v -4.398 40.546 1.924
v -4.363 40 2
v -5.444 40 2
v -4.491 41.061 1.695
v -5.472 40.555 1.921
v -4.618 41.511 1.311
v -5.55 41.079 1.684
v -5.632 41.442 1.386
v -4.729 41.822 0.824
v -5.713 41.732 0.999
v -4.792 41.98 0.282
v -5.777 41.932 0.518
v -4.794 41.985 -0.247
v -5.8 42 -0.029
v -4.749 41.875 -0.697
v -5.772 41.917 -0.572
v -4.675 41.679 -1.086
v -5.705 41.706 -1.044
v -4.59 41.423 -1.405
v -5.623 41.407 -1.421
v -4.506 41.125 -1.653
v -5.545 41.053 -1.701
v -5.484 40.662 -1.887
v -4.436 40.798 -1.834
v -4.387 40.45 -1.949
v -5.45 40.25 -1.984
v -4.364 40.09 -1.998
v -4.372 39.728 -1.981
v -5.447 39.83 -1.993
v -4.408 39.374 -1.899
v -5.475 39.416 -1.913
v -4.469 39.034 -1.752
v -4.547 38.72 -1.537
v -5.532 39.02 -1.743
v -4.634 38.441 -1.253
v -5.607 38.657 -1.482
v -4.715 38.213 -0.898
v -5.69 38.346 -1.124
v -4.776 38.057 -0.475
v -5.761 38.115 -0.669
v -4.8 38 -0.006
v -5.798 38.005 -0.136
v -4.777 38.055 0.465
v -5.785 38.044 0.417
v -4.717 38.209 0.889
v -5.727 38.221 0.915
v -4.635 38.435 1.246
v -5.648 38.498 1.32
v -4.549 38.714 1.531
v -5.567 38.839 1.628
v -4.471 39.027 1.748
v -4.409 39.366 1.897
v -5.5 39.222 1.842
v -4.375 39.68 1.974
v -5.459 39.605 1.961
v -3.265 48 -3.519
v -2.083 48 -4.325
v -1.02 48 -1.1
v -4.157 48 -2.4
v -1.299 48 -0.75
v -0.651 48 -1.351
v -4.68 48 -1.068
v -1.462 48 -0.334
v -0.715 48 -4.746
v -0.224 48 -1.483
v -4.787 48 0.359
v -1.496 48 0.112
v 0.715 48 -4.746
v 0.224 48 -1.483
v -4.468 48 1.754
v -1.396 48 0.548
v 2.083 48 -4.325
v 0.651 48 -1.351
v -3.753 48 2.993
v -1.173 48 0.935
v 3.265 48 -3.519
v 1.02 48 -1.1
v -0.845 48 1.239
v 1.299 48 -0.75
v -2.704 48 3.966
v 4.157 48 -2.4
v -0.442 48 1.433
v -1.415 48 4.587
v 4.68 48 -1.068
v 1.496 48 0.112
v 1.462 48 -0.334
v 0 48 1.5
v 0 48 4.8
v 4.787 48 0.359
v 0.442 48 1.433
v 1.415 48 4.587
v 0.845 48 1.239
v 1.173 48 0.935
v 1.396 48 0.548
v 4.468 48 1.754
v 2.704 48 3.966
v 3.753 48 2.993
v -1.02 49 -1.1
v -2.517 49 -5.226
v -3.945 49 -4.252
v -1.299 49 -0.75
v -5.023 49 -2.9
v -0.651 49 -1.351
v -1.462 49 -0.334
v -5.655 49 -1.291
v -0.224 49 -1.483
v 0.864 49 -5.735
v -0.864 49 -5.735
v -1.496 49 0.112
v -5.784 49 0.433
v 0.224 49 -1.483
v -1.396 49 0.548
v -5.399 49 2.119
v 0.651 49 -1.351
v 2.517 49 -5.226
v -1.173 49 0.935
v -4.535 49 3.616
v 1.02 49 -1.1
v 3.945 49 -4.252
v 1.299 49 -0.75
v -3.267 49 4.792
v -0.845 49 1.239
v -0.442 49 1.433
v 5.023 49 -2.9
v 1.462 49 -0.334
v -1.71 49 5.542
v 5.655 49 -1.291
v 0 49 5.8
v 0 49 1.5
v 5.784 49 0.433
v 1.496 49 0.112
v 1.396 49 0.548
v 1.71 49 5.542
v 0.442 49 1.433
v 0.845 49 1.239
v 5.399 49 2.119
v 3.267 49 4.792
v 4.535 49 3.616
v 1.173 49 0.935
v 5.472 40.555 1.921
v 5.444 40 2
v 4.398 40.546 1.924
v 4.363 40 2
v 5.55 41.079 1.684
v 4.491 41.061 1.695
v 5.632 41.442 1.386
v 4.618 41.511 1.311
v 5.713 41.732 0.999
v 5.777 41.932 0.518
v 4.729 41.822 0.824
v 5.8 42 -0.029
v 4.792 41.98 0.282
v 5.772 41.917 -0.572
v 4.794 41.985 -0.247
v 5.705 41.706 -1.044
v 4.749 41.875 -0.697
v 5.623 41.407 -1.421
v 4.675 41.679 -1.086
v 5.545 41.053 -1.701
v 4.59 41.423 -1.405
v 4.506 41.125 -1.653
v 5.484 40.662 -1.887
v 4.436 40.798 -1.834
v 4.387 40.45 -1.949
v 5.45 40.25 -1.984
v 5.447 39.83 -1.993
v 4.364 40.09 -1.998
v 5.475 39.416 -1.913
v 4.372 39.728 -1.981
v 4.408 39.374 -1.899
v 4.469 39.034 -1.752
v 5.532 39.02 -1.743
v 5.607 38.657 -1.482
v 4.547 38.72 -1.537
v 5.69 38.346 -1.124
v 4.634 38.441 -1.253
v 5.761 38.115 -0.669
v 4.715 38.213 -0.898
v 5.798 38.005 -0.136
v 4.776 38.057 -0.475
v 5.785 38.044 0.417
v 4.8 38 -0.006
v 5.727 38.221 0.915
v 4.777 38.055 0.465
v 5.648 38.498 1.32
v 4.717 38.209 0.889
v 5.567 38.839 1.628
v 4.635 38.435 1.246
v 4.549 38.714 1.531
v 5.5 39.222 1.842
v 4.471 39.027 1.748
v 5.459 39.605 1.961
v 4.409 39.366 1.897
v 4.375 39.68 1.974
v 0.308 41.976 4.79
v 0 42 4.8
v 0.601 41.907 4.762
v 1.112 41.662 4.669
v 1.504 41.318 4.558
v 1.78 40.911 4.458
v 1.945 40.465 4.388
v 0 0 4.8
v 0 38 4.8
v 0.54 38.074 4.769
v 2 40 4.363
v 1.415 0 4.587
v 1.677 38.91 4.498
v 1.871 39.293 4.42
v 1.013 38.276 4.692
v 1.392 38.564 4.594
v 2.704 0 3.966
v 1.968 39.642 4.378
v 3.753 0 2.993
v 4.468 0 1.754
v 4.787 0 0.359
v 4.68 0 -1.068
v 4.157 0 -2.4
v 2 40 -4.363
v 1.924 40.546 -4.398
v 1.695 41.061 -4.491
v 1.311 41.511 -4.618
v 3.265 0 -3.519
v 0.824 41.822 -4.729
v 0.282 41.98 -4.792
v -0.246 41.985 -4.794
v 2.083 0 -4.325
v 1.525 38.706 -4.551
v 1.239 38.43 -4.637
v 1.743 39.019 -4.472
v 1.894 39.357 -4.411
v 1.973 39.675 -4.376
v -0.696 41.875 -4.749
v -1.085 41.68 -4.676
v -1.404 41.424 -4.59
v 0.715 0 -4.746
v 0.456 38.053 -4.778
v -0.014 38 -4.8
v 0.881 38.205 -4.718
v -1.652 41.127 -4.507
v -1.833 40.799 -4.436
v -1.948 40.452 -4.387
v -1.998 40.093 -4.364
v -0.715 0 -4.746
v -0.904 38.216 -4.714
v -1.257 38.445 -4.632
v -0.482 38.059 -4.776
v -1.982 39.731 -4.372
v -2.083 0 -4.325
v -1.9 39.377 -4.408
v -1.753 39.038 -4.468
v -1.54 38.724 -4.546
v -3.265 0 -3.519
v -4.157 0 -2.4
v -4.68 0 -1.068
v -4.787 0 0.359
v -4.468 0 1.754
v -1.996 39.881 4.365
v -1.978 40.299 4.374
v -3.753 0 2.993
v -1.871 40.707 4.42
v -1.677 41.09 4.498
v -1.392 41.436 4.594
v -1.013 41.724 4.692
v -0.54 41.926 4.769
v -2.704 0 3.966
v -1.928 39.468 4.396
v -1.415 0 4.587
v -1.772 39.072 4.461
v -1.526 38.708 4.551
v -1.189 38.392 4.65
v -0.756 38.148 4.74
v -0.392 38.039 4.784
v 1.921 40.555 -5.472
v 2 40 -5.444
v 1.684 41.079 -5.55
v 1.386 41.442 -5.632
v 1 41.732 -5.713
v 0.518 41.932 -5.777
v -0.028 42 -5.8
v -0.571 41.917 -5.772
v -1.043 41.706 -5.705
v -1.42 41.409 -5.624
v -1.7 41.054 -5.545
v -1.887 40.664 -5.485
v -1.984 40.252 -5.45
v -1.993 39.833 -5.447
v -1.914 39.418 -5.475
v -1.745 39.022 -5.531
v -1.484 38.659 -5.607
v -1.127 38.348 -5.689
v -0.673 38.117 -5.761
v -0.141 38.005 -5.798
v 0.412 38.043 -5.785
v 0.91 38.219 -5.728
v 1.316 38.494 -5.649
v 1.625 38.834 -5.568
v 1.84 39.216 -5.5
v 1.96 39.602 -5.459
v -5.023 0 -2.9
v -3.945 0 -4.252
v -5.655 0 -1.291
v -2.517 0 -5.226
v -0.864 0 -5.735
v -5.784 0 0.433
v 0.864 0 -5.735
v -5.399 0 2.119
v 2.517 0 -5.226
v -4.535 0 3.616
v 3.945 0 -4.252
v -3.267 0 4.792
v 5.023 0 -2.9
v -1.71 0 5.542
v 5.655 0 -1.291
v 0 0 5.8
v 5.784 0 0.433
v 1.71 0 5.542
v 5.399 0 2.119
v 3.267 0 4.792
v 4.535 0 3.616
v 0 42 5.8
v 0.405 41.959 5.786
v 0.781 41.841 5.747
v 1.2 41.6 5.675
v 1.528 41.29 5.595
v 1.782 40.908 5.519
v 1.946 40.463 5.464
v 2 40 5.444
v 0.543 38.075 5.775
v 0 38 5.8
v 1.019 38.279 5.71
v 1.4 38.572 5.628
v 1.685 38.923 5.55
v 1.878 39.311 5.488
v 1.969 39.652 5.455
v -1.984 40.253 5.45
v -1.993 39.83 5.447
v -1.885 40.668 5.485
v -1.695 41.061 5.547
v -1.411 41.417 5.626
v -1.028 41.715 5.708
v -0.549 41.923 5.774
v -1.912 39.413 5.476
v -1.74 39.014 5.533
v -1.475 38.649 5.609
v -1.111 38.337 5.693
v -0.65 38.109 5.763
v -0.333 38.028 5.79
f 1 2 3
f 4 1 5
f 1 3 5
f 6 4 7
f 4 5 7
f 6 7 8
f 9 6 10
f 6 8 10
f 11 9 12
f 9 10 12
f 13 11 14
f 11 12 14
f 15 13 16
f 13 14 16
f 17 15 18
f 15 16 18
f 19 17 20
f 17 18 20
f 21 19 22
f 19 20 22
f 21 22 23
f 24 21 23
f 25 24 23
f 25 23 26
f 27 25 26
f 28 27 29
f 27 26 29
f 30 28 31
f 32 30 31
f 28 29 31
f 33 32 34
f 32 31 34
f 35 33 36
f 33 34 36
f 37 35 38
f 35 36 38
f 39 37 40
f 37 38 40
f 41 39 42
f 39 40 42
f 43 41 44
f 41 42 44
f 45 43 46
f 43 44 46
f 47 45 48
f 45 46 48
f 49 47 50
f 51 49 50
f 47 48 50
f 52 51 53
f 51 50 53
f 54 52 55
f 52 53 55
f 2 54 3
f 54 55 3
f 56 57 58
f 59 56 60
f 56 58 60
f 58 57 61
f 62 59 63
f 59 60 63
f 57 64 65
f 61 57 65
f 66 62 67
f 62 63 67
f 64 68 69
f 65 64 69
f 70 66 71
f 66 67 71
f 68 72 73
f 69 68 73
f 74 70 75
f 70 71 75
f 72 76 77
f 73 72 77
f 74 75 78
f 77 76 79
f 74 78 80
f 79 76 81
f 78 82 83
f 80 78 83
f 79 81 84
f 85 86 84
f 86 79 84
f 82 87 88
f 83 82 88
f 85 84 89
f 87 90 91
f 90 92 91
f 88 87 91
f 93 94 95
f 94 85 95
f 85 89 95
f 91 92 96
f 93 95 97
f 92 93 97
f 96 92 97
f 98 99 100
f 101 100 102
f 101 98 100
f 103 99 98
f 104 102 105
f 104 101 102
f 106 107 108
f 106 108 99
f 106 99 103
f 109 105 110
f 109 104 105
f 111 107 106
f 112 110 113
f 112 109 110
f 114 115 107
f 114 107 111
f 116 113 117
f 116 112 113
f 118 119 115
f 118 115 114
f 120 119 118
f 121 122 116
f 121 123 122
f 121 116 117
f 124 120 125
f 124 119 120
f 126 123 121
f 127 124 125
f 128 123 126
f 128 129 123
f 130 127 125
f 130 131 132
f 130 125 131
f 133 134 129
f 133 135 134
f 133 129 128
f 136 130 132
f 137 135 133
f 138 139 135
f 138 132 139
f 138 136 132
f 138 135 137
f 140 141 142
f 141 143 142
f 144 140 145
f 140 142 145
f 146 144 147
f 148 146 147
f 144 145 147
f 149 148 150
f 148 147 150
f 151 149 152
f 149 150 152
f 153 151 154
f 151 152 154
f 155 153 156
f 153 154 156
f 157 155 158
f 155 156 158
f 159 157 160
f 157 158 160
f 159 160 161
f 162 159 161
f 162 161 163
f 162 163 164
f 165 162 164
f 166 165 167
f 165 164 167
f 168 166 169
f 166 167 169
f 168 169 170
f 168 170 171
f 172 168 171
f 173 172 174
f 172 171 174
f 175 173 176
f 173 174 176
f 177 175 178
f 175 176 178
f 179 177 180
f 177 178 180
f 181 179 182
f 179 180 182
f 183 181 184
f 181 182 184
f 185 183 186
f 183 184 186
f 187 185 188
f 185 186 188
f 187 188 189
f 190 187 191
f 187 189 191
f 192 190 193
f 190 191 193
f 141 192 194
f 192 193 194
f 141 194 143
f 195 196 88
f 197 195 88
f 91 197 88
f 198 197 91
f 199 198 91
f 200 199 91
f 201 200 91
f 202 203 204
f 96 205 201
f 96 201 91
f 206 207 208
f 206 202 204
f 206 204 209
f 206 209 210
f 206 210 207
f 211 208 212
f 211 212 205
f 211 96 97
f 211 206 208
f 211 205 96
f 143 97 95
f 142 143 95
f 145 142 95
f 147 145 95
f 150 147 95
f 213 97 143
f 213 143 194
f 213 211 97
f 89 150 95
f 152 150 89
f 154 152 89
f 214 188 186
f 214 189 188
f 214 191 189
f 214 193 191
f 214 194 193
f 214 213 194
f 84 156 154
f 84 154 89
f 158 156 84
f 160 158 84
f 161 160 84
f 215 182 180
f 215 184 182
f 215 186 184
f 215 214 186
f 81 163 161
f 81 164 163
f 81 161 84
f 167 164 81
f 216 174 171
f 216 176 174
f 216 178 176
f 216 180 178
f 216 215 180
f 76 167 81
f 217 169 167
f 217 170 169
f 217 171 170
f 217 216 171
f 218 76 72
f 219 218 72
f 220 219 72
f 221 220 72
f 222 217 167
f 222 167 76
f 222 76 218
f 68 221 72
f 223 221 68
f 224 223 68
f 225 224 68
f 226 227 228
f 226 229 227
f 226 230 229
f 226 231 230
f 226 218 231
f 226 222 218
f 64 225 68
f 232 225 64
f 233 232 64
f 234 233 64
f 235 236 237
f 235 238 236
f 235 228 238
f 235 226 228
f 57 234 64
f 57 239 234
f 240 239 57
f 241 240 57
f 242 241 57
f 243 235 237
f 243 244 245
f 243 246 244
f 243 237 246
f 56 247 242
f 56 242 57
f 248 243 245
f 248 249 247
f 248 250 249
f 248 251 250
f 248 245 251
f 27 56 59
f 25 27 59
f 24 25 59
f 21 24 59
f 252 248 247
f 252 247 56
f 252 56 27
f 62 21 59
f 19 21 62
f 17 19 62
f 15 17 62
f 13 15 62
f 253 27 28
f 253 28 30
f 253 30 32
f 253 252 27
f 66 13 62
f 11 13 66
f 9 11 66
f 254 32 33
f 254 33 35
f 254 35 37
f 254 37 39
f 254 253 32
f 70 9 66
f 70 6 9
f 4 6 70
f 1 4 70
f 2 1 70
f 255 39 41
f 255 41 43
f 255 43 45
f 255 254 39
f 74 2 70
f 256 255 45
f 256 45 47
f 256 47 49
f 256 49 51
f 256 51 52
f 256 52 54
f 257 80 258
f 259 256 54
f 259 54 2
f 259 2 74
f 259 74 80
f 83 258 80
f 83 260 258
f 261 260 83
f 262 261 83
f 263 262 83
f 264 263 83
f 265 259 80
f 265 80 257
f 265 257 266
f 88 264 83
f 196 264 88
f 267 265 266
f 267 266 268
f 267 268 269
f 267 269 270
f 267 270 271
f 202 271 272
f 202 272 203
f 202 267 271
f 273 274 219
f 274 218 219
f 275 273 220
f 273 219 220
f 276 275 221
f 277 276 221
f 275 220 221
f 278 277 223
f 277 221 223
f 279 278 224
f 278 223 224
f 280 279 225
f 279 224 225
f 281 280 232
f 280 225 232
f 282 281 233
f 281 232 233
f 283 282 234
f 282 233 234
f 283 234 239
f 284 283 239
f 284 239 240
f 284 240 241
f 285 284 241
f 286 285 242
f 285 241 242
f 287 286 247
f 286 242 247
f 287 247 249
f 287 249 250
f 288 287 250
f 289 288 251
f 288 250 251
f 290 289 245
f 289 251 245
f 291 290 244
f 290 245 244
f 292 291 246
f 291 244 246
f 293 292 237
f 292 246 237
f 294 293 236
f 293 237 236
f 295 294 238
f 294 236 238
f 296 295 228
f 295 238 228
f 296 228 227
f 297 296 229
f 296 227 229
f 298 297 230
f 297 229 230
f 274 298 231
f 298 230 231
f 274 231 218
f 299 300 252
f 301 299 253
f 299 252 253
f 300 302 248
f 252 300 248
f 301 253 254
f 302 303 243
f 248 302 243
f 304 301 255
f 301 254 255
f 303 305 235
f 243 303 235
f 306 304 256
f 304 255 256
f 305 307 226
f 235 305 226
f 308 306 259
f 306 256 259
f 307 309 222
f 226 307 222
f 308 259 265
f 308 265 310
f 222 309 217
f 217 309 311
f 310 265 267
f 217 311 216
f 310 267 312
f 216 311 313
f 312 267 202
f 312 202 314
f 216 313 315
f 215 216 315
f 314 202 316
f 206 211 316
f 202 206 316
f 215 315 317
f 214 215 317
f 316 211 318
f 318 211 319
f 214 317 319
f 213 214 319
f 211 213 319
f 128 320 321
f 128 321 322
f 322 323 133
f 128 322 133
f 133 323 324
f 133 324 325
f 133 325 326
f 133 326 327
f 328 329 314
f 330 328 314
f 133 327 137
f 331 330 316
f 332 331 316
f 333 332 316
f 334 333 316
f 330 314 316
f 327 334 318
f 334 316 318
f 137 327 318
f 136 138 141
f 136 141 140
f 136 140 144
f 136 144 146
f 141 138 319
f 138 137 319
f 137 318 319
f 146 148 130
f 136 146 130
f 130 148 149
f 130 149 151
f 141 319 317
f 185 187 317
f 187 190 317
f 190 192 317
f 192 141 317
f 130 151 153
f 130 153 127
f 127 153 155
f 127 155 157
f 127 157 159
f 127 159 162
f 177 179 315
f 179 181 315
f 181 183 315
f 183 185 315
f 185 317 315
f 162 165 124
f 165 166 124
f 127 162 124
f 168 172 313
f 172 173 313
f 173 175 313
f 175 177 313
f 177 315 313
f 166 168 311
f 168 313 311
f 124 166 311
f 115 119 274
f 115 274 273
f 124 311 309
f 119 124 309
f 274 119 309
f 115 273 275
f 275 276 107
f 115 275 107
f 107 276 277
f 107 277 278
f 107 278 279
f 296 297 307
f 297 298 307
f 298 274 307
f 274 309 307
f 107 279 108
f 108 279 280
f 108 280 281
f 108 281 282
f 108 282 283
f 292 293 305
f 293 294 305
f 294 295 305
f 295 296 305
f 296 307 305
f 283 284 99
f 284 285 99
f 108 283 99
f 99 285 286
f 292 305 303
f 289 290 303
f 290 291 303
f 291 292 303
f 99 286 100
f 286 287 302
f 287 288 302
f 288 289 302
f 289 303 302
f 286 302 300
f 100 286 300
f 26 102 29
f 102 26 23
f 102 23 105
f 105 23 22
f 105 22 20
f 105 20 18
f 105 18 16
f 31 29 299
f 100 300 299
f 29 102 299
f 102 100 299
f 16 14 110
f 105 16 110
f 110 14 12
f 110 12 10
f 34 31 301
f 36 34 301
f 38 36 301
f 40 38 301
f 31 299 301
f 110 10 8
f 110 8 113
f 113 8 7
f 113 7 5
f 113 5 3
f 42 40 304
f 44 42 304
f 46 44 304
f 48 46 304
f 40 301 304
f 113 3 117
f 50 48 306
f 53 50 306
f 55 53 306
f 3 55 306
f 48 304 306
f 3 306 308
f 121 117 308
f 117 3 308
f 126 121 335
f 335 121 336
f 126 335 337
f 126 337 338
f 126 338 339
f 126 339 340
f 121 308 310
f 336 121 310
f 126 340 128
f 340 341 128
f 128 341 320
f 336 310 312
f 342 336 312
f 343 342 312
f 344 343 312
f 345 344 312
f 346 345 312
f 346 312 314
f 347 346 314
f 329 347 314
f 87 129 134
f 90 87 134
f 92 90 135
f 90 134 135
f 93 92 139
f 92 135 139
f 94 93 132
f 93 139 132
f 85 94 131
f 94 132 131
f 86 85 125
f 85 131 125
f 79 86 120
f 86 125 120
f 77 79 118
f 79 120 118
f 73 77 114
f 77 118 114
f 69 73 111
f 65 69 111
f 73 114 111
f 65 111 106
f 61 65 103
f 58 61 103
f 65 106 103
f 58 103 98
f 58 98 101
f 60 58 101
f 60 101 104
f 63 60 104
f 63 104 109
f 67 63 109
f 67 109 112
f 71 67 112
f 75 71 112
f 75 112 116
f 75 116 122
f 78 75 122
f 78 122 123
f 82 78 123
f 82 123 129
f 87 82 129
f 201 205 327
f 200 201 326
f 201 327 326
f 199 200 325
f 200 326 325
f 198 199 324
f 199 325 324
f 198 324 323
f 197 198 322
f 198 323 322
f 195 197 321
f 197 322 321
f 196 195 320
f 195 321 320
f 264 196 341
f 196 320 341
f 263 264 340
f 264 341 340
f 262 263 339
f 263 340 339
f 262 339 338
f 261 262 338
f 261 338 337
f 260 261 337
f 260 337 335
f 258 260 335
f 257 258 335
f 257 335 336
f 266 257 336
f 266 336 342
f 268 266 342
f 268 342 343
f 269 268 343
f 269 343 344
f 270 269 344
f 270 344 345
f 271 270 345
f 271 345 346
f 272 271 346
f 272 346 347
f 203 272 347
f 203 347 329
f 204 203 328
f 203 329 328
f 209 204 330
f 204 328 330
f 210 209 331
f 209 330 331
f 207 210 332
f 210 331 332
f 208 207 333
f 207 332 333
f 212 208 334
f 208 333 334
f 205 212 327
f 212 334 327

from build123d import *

# Parameters (mm, degrees)
SKETCH1_R           = 5.8
BOSS_EXTRUDE1_DEPTH = 49
SHELL2_T            = -1
SKETCH5_R           = 2
CUT_EXTRUDE1_DEPTH  = 50.681787407
CIRPATTERN1_COUNT   = 2
CIRPATTERN1_ANGLE   = 90
CUT_EXTRUDE2_REACH  = 51.682
SKETCH6_R           = 1.5


with BuildPart() as part:
    # Sketch1 → Boss-Extrude1 (new body)
    with BuildSketch(Plane(origin=(0, 0, 0), x_dir=(1, 0, 0), z_dir=(0, 1, 0))):
        with Locations(Location((0, 0, 0), (0, 0, 270))):
            Circle(SKETCH1_R)
    extrude(amount=BOSS_EXTRUDE1_DEPTH)

    # Shell2
    shell2_openings = [part.faces().sort_by_distance(p)[0] for p in [
        (0, 0, 0),
    ]]
    offset(amount=SHELL2_T, openings=shell2_openings, kind=Kind.INTERSECTION)

    # Sketch5 → Cut-Extrude1 (cut, symmetric)
    with BuildSketch(Plane.XY):
        with Locations((0, 40)):
            Circle(SKETCH5_R)
    cut_extrude1 = extrude(amount=CUT_EXTRUDE1_DEPTH, both=True, mode=Mode.SUBTRACT)

    # CirPattern1: Cut-Extrude1 ×2 about axis
    cirpattern1_axis = Axis((0, 49, 0), (0, -1, 0))
    for i in range(1, CIRPATTERN1_COUNT):
        add(cut_extrude1.rotate(cirpattern1_axis, i * CIRPATTERN1_ANGLE / (CIRPATTERN1_COUNT - 1)), mode=Mode.SUBTRACT)

    # Sketch6 → Cut-Extrude2 (cut, up to next)
    with BuildSketch(Plane(origin=(0, 49, 0), x_dir=(1, 0, 0), z_dir=(0, 1, 0)), mode=Mode.PRIVATE) as cut_extrude2_sk1:
        with Locations(Location((0, 0, 0), (0, 0, 270))):
            Circle(SKETCH6_R)
    cut_extrude2_tool1 = extrude(cut_extrude2_sk1.sketch, amount=-CUT_EXTRUDE2_REACH, mode=Mode.PRIVATE) & part.part
    add(cut_extrude2_tool1.solids().sort_by_distance((0, 49, 0))[0], mode=Mode.SUBTRACT)


solid = part.part
